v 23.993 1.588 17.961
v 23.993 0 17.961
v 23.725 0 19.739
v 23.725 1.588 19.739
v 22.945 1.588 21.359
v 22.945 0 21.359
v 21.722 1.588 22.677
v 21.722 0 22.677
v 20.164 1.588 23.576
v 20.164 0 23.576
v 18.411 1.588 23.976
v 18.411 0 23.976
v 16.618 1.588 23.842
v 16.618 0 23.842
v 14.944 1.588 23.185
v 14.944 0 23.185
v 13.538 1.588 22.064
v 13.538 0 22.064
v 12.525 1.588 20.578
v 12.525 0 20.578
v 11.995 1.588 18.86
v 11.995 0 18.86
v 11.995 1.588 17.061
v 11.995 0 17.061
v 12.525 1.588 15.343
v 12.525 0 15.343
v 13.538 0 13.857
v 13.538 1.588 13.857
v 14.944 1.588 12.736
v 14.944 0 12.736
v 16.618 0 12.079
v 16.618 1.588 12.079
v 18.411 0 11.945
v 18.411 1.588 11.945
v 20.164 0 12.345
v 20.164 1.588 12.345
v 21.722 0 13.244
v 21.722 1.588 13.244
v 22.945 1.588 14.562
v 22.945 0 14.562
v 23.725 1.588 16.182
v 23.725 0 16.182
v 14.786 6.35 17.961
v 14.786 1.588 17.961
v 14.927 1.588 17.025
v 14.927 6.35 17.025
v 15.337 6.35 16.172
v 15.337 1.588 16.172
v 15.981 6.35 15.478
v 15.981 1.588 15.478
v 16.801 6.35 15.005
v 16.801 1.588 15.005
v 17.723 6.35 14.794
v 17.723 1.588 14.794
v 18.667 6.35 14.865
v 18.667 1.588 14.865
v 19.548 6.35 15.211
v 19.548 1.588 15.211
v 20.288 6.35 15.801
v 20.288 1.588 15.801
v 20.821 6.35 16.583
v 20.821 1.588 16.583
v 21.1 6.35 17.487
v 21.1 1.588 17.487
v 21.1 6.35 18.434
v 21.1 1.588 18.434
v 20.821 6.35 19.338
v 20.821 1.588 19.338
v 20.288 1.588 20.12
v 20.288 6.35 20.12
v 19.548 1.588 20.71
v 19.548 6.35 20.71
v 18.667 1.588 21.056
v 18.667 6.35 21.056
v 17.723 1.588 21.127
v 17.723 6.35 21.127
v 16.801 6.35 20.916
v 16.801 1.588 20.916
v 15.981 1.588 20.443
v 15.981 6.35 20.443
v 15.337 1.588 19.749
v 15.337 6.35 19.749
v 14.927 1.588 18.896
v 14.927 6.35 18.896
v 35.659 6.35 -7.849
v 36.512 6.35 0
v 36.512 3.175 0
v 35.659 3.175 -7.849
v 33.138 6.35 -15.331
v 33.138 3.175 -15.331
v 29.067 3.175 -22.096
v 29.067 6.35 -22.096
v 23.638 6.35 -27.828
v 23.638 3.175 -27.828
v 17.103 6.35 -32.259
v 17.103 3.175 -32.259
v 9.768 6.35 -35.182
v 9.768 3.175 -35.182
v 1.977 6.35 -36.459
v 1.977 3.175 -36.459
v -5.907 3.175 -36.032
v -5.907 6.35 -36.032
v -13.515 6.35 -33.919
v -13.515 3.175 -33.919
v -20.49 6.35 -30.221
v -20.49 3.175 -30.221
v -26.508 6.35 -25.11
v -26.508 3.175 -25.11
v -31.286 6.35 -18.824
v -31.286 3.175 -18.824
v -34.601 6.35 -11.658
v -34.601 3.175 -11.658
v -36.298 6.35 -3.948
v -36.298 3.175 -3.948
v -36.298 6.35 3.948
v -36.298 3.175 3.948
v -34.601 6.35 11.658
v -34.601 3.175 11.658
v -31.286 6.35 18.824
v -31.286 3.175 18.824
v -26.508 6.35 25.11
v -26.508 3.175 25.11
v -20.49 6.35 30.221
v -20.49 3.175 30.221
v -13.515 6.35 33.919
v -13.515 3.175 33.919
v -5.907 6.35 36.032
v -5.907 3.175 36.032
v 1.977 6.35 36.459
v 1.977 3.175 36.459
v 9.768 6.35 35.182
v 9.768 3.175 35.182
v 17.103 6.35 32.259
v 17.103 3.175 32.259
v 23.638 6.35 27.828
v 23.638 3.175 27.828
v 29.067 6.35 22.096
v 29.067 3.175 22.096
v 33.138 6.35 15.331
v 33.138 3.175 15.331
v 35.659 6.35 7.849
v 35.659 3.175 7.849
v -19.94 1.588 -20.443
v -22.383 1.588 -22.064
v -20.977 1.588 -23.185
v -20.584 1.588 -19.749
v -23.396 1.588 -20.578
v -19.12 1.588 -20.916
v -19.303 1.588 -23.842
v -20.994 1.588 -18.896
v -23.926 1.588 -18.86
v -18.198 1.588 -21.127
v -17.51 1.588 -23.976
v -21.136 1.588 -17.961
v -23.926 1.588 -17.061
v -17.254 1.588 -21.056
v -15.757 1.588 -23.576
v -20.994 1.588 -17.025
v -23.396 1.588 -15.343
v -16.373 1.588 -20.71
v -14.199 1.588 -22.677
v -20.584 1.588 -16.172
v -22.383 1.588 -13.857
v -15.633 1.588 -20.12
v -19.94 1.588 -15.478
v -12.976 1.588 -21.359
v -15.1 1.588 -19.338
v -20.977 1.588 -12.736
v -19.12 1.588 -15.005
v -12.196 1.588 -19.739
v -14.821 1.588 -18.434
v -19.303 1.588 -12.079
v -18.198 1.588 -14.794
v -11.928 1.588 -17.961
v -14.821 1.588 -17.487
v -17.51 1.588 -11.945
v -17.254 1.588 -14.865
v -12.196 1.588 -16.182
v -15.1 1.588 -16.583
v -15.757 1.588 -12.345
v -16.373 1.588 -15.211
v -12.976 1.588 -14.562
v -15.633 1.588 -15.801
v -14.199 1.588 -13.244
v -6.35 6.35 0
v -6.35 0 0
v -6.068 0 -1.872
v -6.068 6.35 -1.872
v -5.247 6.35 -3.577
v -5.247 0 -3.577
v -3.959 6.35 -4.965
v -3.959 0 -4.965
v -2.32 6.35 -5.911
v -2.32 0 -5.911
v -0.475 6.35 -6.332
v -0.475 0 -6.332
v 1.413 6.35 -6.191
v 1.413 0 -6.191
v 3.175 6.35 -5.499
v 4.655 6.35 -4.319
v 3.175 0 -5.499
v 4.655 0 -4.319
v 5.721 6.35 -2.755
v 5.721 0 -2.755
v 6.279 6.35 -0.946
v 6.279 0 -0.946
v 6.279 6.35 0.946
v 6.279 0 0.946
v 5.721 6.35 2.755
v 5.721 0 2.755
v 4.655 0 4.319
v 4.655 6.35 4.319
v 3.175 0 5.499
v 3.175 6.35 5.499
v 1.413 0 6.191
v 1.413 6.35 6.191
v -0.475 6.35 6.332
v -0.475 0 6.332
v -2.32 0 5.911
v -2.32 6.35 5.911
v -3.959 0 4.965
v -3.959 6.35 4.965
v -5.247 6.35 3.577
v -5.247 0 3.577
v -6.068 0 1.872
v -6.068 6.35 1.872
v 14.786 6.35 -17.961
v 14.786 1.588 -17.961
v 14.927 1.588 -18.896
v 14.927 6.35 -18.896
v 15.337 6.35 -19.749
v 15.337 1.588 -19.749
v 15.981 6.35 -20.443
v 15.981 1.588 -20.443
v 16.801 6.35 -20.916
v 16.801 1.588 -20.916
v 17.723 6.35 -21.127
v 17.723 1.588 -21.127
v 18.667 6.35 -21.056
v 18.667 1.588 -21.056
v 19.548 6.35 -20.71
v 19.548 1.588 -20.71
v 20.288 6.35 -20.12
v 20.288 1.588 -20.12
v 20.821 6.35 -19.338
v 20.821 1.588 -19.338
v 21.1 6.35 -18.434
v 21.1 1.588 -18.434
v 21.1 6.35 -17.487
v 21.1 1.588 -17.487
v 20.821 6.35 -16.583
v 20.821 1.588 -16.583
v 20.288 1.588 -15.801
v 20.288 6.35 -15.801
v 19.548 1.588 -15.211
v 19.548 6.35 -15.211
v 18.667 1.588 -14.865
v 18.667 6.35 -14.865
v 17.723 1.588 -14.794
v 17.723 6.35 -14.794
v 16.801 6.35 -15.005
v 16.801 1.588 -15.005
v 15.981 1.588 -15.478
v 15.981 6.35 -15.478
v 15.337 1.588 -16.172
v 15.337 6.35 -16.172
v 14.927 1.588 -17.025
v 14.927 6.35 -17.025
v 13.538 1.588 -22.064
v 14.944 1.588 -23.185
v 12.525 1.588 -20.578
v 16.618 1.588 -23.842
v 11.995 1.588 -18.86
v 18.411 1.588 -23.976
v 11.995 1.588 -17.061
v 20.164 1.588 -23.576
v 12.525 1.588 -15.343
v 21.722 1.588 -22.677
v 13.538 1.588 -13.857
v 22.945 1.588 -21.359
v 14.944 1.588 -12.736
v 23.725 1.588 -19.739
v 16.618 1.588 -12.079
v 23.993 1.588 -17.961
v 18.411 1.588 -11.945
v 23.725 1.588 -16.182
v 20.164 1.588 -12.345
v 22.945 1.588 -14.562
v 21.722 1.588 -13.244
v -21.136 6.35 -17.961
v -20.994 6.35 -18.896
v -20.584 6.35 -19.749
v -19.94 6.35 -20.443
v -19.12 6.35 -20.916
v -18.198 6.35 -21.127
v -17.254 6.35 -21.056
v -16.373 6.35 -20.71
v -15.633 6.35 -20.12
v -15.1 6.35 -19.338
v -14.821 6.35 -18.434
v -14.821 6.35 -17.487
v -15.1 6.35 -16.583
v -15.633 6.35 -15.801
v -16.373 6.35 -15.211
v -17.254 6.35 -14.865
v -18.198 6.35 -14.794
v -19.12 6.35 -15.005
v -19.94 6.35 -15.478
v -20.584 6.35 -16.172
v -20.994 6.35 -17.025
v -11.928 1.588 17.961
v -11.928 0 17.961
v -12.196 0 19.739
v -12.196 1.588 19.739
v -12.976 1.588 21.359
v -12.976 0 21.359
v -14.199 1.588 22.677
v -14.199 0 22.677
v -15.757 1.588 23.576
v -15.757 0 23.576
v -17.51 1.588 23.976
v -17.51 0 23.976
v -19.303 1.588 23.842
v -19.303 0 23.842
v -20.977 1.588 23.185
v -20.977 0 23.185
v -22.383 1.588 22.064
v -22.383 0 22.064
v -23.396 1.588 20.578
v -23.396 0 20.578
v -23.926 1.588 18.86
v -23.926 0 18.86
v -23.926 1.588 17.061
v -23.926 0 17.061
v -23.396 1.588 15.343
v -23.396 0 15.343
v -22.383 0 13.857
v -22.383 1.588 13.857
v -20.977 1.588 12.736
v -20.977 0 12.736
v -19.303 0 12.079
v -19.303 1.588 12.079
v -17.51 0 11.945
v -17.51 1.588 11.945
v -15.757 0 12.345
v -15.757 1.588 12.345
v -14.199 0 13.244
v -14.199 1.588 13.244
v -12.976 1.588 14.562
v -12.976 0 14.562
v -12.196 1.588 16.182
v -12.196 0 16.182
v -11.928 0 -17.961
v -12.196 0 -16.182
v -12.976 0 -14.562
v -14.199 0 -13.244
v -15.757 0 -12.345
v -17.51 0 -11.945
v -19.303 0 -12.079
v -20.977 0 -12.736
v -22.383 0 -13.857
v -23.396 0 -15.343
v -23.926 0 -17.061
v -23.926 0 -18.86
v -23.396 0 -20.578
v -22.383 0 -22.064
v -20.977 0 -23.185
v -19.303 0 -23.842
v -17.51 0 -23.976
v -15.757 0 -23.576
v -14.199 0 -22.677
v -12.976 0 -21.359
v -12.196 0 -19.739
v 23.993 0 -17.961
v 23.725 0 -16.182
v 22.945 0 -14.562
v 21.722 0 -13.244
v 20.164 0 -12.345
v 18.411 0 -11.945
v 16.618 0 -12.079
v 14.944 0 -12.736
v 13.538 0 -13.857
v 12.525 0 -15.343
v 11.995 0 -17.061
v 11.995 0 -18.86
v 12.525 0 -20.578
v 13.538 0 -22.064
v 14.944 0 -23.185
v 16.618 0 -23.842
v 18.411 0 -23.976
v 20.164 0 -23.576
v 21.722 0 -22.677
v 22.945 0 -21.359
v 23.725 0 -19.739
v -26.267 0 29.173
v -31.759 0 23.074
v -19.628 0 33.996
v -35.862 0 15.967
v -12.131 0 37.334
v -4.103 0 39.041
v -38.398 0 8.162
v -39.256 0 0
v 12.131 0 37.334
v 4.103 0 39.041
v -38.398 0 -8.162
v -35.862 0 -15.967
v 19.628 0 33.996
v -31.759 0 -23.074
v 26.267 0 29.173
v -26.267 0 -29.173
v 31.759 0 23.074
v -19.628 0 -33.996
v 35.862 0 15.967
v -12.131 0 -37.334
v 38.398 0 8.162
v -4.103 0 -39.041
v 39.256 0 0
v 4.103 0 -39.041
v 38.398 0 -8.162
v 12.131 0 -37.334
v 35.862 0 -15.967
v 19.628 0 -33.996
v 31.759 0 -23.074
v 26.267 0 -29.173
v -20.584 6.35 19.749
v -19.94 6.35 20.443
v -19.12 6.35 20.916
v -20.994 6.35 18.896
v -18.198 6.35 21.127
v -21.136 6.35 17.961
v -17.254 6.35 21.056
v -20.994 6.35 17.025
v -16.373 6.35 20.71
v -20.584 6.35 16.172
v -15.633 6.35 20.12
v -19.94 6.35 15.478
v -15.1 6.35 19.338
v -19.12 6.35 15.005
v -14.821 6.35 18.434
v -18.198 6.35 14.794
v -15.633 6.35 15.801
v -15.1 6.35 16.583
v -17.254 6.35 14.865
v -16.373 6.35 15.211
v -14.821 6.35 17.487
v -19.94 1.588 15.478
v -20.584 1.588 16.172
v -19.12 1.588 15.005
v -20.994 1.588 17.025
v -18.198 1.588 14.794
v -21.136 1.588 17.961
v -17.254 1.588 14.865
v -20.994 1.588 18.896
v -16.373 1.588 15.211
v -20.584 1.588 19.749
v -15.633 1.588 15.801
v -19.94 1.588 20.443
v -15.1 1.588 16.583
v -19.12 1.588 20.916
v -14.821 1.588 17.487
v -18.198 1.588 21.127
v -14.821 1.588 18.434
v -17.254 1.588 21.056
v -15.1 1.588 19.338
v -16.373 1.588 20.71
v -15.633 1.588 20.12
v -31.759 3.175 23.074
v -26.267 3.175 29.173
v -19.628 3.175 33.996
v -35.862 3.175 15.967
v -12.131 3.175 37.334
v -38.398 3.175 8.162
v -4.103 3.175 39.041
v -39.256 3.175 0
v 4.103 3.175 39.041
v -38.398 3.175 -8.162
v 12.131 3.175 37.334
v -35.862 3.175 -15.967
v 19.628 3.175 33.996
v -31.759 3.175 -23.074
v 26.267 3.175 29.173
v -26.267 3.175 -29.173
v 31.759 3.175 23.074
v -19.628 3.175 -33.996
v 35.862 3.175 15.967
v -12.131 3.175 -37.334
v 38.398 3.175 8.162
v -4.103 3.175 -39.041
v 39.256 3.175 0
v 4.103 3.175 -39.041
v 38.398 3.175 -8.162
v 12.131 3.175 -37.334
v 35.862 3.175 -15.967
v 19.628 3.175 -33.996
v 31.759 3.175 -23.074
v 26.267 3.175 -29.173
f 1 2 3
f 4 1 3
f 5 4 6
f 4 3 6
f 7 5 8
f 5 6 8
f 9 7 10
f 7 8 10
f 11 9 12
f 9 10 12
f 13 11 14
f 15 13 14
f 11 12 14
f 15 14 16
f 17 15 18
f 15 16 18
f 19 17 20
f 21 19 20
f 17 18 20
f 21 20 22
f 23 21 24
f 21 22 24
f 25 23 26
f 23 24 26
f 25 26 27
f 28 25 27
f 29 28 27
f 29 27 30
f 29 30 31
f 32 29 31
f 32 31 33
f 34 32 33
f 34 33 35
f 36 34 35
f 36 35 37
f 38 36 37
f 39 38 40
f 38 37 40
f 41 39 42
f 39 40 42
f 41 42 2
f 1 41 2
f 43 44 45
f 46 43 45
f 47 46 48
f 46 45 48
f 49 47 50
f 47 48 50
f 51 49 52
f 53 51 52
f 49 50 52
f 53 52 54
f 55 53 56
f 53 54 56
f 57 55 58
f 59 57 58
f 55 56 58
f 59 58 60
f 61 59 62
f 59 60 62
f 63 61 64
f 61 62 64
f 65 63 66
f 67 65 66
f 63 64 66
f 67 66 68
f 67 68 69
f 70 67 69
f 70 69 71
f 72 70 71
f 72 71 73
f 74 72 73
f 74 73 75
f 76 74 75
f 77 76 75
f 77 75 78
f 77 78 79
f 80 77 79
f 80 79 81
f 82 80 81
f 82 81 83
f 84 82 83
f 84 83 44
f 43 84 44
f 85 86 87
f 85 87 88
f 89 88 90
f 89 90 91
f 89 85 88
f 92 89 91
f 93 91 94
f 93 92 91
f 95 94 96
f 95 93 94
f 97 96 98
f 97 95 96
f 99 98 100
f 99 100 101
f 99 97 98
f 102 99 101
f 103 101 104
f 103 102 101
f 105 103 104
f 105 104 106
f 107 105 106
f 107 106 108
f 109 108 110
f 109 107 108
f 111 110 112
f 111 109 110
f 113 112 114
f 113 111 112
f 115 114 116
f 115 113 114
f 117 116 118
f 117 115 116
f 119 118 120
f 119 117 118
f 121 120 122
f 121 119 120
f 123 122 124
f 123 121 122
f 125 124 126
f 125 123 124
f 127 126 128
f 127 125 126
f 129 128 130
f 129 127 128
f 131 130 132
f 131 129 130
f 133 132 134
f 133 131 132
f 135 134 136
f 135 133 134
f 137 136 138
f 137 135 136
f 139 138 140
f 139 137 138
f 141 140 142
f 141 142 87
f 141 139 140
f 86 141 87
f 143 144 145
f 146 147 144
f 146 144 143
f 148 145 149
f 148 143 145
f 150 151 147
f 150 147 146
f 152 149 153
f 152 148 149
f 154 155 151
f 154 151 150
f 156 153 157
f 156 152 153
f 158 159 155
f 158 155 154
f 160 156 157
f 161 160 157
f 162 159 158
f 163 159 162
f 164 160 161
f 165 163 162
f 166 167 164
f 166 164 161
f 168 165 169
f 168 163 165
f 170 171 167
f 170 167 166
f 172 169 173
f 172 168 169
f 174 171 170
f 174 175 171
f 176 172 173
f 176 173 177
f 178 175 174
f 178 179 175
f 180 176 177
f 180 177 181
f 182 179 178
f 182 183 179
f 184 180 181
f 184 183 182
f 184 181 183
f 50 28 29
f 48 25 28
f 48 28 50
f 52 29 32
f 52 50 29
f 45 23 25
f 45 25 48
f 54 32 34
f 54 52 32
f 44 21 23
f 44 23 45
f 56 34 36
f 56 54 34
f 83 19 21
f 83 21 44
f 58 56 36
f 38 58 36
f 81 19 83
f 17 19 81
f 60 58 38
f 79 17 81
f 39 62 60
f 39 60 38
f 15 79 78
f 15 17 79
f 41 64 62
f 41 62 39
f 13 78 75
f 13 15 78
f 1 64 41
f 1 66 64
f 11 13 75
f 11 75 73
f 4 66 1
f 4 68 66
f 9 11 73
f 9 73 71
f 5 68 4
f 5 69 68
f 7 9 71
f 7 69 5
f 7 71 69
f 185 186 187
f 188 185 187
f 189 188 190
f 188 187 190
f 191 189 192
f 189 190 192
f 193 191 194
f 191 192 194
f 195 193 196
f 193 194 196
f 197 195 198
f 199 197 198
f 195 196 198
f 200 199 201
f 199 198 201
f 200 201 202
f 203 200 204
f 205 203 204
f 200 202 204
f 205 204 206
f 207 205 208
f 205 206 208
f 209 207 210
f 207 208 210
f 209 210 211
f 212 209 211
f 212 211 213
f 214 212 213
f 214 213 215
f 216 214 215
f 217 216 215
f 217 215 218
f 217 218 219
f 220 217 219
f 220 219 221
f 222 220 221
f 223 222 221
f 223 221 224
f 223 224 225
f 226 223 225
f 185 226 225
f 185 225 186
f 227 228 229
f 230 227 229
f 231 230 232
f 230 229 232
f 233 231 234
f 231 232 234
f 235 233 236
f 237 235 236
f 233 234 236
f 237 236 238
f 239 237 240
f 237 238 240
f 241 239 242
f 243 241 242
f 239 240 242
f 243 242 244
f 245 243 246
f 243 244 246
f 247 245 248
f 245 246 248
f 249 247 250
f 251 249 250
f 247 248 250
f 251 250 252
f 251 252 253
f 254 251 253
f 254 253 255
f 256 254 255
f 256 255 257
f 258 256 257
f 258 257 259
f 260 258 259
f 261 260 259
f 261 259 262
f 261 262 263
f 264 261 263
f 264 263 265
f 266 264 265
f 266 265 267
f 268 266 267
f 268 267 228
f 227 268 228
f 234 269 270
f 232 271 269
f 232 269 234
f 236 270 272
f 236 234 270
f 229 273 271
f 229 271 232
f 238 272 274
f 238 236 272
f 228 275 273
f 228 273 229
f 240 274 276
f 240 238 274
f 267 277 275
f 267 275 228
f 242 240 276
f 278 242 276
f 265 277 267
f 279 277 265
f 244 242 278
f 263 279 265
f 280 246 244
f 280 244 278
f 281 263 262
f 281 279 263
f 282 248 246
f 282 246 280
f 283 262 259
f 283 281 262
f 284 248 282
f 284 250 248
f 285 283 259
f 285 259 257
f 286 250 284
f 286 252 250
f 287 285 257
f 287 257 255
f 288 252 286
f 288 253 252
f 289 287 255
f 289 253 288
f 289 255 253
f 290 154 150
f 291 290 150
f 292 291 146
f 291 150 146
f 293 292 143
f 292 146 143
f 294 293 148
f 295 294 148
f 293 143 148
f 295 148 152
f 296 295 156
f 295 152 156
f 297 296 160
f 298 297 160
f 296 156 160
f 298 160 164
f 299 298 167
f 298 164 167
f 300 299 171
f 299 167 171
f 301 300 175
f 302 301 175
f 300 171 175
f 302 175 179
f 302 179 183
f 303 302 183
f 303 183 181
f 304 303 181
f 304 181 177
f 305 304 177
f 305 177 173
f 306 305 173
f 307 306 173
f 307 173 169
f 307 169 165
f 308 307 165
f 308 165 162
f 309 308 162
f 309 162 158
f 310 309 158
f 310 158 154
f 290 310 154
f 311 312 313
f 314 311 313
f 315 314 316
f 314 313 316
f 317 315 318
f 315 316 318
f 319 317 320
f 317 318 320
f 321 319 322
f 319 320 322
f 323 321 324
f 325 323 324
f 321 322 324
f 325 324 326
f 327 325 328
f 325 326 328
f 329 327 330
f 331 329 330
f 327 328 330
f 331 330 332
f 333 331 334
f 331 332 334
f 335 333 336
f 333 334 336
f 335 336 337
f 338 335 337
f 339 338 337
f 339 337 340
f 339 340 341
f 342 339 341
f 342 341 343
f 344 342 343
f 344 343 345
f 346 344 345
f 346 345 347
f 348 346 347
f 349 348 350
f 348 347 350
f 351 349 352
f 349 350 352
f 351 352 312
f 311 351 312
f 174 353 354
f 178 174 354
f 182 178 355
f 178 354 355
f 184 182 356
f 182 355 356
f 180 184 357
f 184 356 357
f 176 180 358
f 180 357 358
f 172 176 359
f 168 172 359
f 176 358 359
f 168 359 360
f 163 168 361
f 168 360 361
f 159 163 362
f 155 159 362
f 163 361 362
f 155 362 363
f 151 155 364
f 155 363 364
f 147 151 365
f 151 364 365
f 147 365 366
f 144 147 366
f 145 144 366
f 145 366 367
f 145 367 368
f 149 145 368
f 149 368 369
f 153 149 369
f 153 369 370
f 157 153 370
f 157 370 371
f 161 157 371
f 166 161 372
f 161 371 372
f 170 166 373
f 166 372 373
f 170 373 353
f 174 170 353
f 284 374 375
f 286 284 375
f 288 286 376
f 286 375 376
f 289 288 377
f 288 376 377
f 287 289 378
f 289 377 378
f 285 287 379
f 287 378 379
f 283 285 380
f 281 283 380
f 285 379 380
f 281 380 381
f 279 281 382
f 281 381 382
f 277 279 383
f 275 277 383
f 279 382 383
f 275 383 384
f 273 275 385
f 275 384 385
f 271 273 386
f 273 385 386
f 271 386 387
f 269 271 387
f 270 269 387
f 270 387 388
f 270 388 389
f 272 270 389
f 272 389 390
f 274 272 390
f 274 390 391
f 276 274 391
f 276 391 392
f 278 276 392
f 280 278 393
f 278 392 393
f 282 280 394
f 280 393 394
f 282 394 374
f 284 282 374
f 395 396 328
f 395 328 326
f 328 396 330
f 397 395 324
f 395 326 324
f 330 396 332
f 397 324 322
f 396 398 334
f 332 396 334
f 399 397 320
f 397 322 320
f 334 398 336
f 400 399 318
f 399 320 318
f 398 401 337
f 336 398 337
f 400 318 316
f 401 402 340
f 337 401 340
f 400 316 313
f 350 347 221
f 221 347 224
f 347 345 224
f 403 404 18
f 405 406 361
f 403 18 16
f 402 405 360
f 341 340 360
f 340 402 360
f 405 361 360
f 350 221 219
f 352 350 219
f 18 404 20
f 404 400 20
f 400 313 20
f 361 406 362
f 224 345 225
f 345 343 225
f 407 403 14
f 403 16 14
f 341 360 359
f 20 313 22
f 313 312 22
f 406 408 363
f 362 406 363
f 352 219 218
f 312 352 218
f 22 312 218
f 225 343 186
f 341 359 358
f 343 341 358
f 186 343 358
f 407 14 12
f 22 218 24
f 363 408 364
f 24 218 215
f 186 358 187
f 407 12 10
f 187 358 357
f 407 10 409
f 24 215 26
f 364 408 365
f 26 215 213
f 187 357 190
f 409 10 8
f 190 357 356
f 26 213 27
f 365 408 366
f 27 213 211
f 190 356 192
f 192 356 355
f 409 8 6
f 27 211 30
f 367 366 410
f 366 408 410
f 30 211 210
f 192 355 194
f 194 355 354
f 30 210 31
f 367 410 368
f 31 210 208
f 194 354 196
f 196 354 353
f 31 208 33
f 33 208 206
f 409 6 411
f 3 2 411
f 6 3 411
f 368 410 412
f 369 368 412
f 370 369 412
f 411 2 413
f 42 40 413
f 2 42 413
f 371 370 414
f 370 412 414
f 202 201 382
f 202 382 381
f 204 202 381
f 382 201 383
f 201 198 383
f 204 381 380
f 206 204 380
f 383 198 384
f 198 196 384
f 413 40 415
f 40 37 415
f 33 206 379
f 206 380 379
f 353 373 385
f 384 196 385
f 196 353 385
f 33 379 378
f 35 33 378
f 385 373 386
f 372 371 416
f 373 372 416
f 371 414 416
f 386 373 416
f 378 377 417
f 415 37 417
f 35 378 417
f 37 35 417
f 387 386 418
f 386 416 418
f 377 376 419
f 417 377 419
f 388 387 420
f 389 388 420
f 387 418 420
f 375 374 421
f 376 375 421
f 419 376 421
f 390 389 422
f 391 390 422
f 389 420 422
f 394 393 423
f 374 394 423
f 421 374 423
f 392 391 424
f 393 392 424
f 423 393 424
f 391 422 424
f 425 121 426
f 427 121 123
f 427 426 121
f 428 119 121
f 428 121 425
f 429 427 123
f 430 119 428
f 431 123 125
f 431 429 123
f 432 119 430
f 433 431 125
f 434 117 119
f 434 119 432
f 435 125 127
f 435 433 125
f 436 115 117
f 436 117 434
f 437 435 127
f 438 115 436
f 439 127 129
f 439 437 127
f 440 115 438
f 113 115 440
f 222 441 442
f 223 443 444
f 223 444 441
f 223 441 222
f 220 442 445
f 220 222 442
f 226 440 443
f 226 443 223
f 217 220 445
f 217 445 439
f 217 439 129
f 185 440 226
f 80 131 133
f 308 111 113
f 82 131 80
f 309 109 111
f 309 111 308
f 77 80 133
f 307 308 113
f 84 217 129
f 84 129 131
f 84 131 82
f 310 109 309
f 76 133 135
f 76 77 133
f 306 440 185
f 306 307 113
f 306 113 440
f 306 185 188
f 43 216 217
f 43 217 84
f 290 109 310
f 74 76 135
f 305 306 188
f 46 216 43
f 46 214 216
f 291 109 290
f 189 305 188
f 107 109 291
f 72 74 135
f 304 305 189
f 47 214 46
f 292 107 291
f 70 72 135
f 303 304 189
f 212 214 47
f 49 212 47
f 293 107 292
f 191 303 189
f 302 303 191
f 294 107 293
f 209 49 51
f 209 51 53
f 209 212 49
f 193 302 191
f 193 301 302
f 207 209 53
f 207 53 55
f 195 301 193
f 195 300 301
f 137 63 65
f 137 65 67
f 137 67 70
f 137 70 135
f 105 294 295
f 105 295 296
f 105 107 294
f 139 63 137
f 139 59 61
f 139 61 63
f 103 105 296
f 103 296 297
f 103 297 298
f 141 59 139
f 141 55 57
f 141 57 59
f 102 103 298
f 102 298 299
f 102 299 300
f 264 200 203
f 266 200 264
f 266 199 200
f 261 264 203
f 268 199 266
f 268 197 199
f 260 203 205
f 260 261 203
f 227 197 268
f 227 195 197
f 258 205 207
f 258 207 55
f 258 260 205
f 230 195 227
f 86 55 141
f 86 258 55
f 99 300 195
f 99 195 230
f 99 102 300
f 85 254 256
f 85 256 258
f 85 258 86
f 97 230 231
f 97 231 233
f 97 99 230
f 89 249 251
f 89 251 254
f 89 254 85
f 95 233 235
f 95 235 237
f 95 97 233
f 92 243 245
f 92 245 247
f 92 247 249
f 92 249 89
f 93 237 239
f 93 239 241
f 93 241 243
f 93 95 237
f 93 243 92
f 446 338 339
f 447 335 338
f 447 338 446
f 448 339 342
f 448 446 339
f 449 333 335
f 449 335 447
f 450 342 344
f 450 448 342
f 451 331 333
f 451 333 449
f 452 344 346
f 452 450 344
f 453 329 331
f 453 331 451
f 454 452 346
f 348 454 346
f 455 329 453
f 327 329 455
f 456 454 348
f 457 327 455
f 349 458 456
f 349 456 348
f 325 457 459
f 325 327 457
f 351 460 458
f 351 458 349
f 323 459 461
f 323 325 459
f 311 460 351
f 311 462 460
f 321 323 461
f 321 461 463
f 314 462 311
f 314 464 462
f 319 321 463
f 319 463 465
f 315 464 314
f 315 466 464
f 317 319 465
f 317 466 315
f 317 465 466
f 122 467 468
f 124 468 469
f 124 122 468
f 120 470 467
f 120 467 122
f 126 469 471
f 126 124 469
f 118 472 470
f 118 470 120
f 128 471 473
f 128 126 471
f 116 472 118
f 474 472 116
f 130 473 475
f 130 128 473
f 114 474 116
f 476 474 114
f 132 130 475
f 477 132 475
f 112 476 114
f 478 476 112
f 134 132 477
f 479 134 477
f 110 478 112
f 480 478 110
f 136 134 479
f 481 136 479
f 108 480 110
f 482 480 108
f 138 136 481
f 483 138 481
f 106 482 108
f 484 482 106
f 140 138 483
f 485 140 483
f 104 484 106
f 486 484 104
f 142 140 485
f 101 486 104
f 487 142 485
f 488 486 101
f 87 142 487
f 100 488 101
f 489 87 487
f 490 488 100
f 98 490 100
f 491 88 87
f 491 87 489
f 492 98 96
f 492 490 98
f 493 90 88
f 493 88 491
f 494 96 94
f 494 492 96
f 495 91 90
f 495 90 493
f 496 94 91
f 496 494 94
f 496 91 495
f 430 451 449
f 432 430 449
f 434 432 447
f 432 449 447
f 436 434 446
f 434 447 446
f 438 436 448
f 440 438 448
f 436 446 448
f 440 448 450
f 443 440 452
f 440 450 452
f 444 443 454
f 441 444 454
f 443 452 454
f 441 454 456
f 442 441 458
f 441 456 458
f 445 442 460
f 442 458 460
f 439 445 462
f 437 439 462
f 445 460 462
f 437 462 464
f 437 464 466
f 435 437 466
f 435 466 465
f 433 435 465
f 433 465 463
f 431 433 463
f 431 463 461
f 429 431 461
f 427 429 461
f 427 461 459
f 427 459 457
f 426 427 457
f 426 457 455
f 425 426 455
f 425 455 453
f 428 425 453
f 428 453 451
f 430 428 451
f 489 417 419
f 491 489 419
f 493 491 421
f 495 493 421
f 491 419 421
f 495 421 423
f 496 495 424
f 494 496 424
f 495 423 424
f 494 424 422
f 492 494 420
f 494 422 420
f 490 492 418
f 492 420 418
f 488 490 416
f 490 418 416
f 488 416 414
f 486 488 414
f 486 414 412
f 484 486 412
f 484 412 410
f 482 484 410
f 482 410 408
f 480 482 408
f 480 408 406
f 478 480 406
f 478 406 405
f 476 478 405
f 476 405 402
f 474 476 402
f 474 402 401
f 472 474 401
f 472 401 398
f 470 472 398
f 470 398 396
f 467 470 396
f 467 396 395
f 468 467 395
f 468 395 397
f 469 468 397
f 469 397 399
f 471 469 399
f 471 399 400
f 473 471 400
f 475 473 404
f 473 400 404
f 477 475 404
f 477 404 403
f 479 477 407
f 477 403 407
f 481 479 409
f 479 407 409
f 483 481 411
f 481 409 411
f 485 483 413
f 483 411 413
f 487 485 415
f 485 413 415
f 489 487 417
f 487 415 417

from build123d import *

# Parameters (mm, degrees)
SKETCH2_R                   = 39.2557
BOSS_EXTRUDE1_DEPTH         = 6.35
SKETCH4_R                   = 39.2557
SKETCH4_R_2                 = 36.5125
CUT_EXTRUDE1_DEPTH          = 3.175
F_1_4_0_25_DIAMETER_HOLE1_D = 6.35
F_1_2_0_5_DIAMETER_HOLE1_D  = 12.7
SKETCH9_R                   = 6.0325
CUT_EXTRUDE2_DEPTH          = 1.5875


with BuildPart() as part:
    # Sketch2 → Boss-Extrude1 (new body)
    with BuildSketch(Plane(origin=(0, 0, 0), x_dir=(1, 0, 0), z_dir=(0, 1, 0))):
        Circle(SKETCH2_R)
    extrude(amount=BOSS_EXTRUDE1_DEPTH)

    # Sketch4 → Cut-Extrude1 (cut)
    with BuildSketch(Plane(origin=(0, 6.35, 0), x_dir=(1, 0, 0), z_dir=(0, 1, 0))):
        Circle(SKETCH4_R)
        Circle(SKETCH4_R_2, mode=Mode.SUBTRACT)
    extrude(amount=-CUT_EXTRUDE1_DEPTH, mode=Mode.SUBTRACT)

    # 1/4 (0.25) Diameter Hole1 (through all)
    with Locations(Plane(origin=(0, 6.35, 0), x_dir=(1, 0, 0), z_dir=(0, 1, 0))):
        with Locations((-17.960512242, 17.960512242), (-17.960512242, -17.960512242), (17.960512242, 17.960512242), (17.960512242, -17.960512242)):
            Hole(F_1_4_0_25_DIAMETER_HOLE1_D / 2)

    # 1/2 (0.5) Diameter Hole1 (through all)
    with Locations(Plane(origin=(0, 6.35, 0), x_dir=(1, 0, 0), z_dir=(0, 1, 0))):
        with Locations((0, 0)):
            Hole(F_1_2_0_5_DIAMETER_HOLE1_D / 2)

    # Sketch9 → Cut-Extrude2 (cut)
    with BuildSketch(Plane.XZ):
        with Locations((-17.960512242, 17.960512242)):
            Circle(SKETCH9_R)
        with Locations((17.960512242, 17.960512242)):
            Circle(SKETCH9_R)
        with Locations((17.960512242, -17.960512242)):
            Circle(SKETCH9_R)
        with Locations((-17.960512242, -17.960512242)):
            Circle(SKETCH9_R)
    extrude(amount=-CUT_EXTRUDE2_DEPTH, mode=Mode.SUBTRACT)


solid = part.part
